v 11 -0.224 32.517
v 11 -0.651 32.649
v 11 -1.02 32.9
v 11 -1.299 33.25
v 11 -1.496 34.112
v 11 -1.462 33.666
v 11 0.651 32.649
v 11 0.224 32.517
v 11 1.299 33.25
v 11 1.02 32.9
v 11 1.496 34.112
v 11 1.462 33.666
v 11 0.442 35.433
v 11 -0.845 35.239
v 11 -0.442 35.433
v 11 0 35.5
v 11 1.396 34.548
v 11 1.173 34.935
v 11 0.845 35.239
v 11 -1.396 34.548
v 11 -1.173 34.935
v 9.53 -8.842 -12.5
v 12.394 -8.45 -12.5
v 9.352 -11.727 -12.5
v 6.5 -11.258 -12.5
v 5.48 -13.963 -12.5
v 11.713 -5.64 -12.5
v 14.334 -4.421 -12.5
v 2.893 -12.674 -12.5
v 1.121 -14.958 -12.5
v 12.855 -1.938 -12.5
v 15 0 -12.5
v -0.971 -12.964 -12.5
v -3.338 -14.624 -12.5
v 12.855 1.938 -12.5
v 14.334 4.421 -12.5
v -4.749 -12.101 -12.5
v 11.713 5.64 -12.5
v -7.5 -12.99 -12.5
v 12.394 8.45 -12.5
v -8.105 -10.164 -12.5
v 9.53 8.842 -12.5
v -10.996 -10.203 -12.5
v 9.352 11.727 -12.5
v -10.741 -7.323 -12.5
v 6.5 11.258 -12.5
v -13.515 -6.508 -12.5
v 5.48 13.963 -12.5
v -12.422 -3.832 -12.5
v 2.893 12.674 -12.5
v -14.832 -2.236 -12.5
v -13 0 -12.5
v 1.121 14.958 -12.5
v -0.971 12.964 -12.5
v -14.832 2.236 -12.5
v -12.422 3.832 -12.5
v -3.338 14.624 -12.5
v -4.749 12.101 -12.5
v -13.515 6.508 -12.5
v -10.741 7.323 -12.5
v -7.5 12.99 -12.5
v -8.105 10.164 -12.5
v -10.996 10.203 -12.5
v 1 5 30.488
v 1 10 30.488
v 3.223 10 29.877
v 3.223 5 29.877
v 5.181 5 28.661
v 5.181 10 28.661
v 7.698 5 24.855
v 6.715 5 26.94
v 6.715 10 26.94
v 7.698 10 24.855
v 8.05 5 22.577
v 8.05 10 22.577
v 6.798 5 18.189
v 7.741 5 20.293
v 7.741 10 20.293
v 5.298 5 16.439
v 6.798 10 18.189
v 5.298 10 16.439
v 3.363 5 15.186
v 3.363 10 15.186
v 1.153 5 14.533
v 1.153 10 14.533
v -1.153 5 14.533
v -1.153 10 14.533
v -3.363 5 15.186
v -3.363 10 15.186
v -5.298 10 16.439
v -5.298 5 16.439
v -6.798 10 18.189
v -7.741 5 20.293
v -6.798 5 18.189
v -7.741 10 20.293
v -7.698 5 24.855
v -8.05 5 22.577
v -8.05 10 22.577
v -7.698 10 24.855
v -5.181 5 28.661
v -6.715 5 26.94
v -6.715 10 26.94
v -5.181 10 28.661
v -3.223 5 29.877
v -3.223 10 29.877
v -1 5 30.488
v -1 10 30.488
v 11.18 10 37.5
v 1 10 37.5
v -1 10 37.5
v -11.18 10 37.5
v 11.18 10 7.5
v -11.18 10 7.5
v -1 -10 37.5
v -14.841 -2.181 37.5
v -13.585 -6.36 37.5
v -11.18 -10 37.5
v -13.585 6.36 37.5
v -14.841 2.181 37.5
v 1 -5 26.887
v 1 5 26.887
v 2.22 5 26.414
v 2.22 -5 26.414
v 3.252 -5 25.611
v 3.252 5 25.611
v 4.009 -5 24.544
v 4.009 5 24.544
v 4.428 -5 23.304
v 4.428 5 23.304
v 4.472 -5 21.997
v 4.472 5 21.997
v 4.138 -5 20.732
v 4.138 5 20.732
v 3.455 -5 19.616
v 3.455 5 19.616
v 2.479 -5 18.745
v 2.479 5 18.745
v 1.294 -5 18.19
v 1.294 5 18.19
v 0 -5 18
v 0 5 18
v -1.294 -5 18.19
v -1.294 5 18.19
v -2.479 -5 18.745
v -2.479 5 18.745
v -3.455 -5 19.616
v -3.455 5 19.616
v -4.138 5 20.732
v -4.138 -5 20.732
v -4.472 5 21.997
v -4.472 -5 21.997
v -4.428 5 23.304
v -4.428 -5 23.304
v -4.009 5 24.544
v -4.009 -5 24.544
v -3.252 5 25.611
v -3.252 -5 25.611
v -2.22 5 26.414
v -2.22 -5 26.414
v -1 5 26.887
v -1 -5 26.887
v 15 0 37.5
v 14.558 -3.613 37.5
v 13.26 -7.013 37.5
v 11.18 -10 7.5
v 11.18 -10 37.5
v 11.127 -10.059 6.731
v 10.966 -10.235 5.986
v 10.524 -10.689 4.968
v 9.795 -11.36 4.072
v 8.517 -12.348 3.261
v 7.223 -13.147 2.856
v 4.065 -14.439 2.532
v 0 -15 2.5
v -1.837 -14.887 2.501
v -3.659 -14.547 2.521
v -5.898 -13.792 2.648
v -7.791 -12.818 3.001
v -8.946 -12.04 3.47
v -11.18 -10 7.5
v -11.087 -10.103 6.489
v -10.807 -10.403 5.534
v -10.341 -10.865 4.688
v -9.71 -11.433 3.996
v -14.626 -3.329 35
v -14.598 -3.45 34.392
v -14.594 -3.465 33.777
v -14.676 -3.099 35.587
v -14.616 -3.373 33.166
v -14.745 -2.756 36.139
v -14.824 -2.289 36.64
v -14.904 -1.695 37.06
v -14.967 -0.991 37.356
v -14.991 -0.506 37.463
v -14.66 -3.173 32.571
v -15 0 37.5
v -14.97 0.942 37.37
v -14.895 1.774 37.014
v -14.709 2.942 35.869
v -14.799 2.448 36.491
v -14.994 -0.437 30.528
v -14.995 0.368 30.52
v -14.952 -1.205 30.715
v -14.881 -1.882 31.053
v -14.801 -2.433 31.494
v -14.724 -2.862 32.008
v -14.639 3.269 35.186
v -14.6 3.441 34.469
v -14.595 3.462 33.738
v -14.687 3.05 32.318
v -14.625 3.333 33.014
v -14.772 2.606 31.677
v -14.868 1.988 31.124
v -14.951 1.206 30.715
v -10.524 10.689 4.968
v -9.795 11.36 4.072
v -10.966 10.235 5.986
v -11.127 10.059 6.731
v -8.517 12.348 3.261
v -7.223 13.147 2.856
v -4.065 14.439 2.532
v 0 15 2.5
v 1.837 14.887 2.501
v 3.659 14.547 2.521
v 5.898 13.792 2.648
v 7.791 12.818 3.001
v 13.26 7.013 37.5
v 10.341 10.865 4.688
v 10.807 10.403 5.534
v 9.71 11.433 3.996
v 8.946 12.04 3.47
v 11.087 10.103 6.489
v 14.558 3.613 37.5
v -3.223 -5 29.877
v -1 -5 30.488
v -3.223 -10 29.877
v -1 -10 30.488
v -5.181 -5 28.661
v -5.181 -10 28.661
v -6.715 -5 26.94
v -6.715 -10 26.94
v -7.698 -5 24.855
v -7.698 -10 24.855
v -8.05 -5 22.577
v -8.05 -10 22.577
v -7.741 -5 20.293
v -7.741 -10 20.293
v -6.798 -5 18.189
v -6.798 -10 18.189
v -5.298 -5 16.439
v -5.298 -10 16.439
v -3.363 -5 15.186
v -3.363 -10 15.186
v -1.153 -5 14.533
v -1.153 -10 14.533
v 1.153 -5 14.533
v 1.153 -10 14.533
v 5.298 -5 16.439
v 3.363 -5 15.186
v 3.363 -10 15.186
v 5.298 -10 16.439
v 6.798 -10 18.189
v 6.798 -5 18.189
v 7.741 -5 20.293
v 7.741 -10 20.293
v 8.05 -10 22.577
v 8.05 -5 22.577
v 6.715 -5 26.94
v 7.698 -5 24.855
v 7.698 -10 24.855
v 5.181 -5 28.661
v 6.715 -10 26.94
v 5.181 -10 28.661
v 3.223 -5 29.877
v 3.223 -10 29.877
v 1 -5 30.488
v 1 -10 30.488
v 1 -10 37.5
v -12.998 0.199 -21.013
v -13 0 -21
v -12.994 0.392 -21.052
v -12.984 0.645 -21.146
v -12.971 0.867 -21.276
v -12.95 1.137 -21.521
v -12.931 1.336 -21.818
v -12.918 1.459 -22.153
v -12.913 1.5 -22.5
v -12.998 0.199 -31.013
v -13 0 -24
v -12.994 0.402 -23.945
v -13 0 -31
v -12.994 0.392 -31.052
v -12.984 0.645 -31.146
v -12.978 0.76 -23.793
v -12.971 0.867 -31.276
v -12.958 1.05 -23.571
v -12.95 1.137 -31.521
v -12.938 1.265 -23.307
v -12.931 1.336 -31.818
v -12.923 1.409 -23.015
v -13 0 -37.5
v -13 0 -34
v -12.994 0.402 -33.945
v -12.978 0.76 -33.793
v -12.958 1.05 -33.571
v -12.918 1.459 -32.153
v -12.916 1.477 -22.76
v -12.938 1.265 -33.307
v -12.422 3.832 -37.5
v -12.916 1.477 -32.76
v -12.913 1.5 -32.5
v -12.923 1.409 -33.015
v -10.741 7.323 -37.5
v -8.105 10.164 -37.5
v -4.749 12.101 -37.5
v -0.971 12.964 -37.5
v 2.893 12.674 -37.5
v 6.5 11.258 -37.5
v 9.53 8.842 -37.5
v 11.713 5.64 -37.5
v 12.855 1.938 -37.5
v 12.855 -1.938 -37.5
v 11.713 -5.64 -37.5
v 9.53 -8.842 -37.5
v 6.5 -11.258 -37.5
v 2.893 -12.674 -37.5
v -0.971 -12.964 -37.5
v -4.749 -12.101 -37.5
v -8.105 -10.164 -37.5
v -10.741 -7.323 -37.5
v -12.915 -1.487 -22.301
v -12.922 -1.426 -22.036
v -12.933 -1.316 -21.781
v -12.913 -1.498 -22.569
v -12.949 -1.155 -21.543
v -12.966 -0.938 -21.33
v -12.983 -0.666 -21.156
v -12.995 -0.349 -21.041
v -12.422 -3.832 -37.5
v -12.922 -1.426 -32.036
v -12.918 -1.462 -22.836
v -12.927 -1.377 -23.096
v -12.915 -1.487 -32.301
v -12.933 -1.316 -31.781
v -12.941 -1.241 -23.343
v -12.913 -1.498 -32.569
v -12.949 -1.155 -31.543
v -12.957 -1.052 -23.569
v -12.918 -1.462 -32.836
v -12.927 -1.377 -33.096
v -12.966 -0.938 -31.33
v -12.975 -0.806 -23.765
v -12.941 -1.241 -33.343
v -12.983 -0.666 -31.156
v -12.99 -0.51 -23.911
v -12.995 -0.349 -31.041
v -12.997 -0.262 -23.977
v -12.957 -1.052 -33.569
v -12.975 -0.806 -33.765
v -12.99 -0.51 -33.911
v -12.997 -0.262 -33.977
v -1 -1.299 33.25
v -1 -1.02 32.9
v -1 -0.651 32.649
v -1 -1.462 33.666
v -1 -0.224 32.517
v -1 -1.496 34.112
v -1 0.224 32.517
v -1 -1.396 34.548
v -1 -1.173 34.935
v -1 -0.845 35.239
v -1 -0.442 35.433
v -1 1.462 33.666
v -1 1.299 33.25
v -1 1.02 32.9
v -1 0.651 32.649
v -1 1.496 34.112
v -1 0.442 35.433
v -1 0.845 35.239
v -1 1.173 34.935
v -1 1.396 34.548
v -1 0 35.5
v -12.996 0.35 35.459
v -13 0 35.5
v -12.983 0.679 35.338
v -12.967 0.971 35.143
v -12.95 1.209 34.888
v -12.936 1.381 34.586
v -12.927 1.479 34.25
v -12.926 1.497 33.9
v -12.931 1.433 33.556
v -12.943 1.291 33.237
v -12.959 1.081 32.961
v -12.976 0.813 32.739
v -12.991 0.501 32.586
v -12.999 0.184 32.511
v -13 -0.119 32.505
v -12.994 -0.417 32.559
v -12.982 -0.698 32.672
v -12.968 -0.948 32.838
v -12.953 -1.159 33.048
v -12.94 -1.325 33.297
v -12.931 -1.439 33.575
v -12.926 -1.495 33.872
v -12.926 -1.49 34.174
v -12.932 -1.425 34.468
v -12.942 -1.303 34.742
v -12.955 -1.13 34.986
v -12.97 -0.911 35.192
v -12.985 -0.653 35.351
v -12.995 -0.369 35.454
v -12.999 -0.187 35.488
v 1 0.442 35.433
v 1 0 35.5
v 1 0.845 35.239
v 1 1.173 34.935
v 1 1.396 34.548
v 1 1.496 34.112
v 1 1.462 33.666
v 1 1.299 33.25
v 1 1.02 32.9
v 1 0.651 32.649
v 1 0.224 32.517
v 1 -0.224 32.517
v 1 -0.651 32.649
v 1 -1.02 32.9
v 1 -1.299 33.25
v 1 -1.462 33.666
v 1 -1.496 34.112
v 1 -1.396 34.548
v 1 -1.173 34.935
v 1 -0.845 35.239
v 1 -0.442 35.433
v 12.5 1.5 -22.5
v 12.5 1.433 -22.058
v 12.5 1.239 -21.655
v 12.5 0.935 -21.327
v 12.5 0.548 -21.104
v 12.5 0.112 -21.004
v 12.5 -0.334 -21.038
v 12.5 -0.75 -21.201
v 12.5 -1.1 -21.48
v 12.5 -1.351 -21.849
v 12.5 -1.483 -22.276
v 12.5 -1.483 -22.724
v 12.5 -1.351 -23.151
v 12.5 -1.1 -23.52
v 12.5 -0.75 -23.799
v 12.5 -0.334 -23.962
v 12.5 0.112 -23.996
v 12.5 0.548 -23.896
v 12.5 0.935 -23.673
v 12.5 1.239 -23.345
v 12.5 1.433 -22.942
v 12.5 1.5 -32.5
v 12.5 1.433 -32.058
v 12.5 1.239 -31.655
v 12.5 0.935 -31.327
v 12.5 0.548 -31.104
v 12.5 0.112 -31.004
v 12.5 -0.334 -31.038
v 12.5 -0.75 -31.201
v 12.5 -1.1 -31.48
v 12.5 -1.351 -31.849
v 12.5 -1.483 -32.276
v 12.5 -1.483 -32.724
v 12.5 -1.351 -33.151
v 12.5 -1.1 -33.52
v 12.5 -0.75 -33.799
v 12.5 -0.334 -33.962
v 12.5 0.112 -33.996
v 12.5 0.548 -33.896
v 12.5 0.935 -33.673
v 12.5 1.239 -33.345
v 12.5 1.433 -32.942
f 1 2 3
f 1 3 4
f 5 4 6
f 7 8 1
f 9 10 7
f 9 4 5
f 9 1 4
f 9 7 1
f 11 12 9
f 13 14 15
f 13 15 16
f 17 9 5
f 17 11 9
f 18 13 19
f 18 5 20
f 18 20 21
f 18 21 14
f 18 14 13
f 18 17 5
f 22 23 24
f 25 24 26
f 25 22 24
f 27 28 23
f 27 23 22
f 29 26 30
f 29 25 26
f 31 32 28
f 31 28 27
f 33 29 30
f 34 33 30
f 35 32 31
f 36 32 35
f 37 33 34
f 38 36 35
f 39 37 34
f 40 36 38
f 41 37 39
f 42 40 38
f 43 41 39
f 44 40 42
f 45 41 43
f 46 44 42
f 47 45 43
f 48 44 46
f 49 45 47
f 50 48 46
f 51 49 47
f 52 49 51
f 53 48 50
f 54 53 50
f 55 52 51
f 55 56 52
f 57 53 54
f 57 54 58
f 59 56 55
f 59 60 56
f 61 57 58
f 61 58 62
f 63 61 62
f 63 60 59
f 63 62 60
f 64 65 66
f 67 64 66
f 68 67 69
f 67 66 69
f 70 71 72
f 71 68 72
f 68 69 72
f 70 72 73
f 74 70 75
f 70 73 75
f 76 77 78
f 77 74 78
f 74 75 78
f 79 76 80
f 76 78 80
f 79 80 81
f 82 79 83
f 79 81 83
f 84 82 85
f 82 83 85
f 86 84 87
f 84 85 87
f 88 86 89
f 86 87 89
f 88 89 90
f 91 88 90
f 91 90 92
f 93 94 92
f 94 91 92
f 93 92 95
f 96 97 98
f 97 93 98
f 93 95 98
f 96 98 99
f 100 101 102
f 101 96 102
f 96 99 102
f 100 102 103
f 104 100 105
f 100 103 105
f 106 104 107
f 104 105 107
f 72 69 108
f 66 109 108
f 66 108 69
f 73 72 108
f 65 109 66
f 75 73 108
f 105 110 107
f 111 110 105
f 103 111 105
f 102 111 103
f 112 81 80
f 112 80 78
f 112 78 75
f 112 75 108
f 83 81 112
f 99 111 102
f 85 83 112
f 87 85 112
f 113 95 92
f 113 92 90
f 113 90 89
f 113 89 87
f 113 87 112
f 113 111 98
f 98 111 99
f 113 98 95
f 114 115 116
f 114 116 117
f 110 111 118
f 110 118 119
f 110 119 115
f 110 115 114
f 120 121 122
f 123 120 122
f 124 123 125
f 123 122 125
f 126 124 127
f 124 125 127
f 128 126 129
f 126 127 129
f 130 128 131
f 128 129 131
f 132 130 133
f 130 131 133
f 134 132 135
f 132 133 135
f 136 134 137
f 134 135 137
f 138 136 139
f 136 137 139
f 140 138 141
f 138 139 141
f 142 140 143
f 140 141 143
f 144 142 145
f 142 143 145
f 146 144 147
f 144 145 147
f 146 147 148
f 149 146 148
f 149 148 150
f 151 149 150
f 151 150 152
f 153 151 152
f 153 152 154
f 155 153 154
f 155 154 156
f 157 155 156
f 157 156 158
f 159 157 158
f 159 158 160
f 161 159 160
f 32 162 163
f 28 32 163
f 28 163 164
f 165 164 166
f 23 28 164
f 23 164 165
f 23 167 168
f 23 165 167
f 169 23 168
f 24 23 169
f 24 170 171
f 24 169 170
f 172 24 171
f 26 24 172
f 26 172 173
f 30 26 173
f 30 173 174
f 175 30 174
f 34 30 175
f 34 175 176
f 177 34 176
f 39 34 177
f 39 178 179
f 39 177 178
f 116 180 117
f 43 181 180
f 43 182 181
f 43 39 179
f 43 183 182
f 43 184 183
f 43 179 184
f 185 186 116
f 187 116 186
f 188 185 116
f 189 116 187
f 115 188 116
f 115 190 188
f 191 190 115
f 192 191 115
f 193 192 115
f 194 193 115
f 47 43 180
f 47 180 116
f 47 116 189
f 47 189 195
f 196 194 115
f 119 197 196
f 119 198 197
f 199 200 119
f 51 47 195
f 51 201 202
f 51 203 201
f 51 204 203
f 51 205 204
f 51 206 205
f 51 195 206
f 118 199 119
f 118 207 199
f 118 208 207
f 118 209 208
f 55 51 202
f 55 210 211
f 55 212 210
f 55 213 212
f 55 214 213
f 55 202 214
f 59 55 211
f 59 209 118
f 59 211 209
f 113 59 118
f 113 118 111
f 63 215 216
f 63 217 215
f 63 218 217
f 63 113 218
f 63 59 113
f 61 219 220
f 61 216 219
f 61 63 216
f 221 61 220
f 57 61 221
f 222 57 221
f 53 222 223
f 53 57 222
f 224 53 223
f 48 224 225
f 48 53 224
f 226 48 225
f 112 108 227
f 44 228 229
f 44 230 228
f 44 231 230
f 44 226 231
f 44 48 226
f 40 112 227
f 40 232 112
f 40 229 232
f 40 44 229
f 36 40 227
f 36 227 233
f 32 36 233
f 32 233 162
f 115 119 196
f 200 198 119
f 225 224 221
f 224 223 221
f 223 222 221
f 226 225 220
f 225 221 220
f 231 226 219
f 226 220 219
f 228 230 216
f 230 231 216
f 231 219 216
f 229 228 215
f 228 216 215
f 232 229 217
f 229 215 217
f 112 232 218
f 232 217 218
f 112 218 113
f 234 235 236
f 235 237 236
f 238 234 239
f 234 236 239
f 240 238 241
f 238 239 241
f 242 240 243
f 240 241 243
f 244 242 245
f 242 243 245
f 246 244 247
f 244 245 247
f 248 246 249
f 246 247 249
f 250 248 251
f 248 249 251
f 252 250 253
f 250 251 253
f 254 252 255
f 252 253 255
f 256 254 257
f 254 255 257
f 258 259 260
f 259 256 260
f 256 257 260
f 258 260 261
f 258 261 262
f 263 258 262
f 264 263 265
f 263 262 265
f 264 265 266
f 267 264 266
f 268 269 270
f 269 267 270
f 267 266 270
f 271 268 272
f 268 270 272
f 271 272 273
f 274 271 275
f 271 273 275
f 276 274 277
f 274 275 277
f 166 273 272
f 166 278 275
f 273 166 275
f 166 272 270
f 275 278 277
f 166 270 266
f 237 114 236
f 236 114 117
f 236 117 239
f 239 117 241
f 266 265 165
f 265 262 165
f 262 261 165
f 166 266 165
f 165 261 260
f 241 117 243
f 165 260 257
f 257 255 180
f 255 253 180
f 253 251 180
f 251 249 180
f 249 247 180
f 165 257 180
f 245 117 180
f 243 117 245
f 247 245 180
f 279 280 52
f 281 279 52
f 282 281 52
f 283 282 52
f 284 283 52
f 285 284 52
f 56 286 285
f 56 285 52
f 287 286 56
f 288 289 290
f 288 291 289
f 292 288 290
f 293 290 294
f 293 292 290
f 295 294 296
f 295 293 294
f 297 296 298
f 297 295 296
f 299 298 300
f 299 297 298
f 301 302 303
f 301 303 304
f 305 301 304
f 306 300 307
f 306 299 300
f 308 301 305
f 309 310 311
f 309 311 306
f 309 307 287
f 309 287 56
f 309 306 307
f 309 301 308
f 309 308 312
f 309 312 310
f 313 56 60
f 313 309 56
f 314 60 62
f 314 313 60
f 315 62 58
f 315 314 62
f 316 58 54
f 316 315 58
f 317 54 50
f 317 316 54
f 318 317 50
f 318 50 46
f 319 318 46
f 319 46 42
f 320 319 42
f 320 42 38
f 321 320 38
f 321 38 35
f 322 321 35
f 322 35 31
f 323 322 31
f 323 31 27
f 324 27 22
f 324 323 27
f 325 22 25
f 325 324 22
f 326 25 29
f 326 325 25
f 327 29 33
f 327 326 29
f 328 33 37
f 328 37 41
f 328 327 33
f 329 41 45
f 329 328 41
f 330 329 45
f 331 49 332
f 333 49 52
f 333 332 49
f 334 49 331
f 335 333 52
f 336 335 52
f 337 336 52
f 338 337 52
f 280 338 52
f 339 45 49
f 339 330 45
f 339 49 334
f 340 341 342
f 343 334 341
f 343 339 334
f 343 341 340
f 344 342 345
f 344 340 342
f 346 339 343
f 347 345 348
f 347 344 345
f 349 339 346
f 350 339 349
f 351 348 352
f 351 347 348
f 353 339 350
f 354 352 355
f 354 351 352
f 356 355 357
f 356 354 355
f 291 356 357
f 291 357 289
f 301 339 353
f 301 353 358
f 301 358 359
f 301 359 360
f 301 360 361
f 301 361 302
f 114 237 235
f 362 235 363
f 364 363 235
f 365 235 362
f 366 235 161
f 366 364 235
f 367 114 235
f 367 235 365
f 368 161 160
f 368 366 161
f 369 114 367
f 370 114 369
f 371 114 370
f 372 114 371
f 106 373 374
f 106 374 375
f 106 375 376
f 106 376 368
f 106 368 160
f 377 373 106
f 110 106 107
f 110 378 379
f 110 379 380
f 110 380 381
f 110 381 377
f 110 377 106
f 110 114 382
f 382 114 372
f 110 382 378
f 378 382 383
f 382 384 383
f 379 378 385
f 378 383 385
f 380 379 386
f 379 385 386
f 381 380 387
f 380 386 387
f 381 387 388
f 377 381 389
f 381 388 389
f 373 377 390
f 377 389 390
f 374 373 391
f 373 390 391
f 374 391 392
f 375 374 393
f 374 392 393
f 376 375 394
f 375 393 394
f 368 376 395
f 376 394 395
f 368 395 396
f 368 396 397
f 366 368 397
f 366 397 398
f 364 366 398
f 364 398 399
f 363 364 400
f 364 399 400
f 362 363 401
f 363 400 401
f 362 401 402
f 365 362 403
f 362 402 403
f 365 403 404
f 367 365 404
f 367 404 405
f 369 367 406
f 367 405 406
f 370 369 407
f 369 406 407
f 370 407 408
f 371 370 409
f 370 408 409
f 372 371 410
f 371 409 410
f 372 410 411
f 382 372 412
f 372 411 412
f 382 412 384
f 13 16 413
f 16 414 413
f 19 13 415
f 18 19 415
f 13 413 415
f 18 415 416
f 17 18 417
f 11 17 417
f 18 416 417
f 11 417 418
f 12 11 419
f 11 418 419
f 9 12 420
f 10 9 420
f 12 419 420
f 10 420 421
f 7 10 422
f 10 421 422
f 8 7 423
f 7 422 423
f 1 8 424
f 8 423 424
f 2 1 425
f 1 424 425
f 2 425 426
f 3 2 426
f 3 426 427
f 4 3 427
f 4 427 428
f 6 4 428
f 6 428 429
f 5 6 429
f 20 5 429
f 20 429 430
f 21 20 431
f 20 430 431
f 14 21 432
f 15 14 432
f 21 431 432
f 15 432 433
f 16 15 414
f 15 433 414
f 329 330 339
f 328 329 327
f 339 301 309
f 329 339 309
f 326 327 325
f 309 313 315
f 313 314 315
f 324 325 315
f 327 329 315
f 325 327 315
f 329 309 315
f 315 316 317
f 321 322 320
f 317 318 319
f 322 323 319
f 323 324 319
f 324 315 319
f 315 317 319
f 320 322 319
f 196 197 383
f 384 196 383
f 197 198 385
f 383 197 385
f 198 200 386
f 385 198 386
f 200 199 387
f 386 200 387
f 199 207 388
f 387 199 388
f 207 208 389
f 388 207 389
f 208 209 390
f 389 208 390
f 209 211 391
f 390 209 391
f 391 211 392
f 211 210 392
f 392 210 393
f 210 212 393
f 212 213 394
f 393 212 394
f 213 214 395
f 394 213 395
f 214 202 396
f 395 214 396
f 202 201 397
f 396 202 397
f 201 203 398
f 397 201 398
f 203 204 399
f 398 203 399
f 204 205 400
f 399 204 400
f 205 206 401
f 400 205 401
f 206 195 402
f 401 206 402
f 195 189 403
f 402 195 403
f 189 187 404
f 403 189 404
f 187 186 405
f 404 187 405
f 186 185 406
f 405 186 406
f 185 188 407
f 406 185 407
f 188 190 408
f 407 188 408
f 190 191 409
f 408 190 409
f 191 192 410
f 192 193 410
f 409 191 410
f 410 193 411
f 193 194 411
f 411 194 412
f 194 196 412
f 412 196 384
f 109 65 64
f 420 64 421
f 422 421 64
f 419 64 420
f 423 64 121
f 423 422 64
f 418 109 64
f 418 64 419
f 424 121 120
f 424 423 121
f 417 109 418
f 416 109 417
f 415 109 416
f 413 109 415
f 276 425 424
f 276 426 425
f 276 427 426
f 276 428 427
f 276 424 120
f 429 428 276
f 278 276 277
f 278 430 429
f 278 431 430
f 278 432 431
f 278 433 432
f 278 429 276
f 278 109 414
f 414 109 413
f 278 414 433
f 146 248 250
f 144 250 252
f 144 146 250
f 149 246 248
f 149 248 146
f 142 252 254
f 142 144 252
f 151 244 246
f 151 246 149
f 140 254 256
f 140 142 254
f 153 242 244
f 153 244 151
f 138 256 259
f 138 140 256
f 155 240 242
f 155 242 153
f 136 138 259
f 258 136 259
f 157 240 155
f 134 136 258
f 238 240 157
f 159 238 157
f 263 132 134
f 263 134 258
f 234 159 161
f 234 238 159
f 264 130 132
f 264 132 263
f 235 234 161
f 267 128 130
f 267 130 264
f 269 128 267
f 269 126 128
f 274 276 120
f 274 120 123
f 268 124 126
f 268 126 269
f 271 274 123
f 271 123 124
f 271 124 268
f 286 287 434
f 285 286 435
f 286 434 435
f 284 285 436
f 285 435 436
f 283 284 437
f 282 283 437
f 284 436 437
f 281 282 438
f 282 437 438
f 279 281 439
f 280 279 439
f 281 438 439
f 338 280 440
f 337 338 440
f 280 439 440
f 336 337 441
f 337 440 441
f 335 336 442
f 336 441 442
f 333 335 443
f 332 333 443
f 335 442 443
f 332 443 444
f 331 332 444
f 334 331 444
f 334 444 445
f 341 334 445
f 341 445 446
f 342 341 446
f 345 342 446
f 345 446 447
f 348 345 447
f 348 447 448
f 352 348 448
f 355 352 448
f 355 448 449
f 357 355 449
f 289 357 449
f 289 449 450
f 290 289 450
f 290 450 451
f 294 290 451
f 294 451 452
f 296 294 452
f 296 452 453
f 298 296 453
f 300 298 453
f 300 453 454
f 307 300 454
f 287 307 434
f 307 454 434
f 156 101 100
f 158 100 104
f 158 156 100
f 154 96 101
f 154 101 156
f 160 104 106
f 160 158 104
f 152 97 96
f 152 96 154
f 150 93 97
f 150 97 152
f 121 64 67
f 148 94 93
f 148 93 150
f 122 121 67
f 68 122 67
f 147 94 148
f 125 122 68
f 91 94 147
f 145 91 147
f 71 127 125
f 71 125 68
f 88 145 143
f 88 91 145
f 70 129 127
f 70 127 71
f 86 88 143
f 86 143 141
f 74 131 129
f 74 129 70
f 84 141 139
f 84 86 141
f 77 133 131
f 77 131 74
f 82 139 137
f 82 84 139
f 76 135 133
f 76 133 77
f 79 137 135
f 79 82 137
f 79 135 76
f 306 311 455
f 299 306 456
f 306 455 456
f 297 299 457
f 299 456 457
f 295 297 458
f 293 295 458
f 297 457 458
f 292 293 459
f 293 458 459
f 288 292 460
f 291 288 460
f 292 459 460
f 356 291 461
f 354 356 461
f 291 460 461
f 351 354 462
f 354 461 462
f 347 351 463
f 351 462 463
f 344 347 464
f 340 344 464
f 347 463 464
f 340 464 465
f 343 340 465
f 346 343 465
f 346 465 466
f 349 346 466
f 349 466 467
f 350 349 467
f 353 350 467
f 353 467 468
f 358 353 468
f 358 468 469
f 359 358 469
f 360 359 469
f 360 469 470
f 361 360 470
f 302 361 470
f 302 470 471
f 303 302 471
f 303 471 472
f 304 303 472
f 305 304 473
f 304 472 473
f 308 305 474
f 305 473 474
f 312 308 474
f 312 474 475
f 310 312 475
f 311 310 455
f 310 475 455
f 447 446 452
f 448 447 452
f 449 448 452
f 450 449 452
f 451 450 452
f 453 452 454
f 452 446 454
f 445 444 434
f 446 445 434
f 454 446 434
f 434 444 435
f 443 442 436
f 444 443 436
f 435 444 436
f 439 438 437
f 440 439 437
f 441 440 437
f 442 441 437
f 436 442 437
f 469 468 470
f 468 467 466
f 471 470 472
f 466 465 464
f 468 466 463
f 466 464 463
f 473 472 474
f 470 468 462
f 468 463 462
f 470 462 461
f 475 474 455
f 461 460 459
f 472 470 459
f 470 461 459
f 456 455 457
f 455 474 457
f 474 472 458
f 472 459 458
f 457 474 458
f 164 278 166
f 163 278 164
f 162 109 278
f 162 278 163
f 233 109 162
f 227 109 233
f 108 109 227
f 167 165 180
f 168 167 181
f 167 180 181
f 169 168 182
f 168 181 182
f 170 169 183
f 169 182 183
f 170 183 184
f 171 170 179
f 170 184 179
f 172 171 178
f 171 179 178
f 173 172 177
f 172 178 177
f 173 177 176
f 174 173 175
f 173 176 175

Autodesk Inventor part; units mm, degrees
ref_plane "YZ Plane" through (0, 0, 0) normal (1, 0, 0) x (0, 1, 0)
ref_plane "XZ Plane" through (0, 0, 0) normal (0, 1, 0) x (-1, 0, 0)
ref_plane "XY Plane" through (0, 0, 0) normal (0, 0, 1) x (1, 0, 0)
sketch "Szkic1" plane through (0, 0, 0) normal (0, 0, 1) x (1, 0, 0)
  circle A0 centre (0, 0) radius 15
  dimension "d0" = 30
extrude "Wyciągnięcie proste1" add sketch "Szkic1" along normal mid plane 75
sketch "Szkic2" plane through (0, 0, -37.5) normal (0, 0, -1) x (-1, 0, 0)
  circle A0 centre (0, 0) radius 13
  circle A1 centre (0, 0) radius 15
  dimension "d3" = 26
  dimension "d4" = 30
extrude "Wyciągnięcie proste2" cut sketch "Szkic2" against normal blind 25
sketch "Szkic3" plane through (0, 0, 0) normal (1, 0, 0) x (0, 1, 0)
  circle A0 centre (0, -32.5) radius 1.5
  circle A1 centre (0, -22.5) radius 1.5
  line L0 (-13, -37.5) -> (13, -37.5) projected
  point P0 (0, 0)
  dimension "d7" = 3
  dimension "d8" = 3
  dimension "d13" = 10
  dimension "d14" = 5
extrude "Wyciągnięcie proste3" cut sketch "Szkic3" against normal blind 25 and the other way blind 12.5
thread "Gwint1" size "M3x0.5" class "6H" standard "ANSI Metric M Profile" full length
thread "Gwint2" size "M3x0.5" class "6H" standard "ANSI Metric M Profile" full length
sketch "Szkic4" plane through (0, 0, 0) normal (1, 0, 0) x (0, 1, 0)
  line L0 (15, 37.5) -> (-15, 37.5) projected
  line L1 (-15, 37.5) -> (-10, 37.5)
  line L2 (-10, 37.5) -> (-10, 7.5)
  line L3 (-15, 2.5) -> (-15, 2.5)
  line L4 (-15, 2.5) -> (-15, 37.5)
  line L5 (15, 37.5) -> (10, 37.5)
  line L6 (10, 37.5) -> (10, 7.5)
  line L7 (15, 2.5) -> (15, 2.5)
  line L8 (15, 2.5) -> (15, 37.5)
  arc A0 (-15, 2.5) -> (-10, 7.5) centre (-15, 7.5) ccw
  arc A1 (10, 7.5) -> (15, 2.5) centre (15, 7.5) ccw
  point P0 (0, 0)
  point P1 (-10, 2.5)
  point P2 (10, 2.5)
  dimension "d19" = 5
  dimension "d20" = 35
  dimension "d21" = 5
  dimension "d22" = 35
  dimension "d25" = 5
  dimension "d26" = 5
extrude "Wyciągnięcie proste4" cut sketch "Szkic4" along normal mid plane 30
sketch "Szkic6" plane through (-11.1803, 10, 7.5) normal (0, 1, 0) x (1, 0, 0)
  line L0 (-3.8197, -30) -> (0, -30) construction
  line L1 (0, 0) -> (22.3607, 0) construction
  line L2 (0, -30) -> (22.3607, -30) construction
  line L3 (22.3607, -30) -> (22.3607, 0) construction
  line L4 (22.3607, 0) -> (0, 0) construction
  line L5 (0, 0) -> (0, -30) construction
  circle A0 centre (11.1803, -15) radius 8.05
  point P0 (11.1803, 7.5)
  dimension "d30" = 16.1
extrude "Wyciągnięcie proste6" cut sketch "Szkic6" against normal blind 5
sketch "Szkic7" plane through (0, 5, 22.5) normal (0, 1, 0) x (1, 0, 0)
  circle A0 centre (0, 0) radius 4.5
  point P0 (0, 22.5)
  dimension "d33" = 9
extrude "Wyciągnięcie proste7" cut sketch "Szkic7" against normal blind 30
sketch "Szkic8" plane through (0, 0, 37.5) normal (0, 0, 1) x (1, 0, 0)
  line L0 (-1, 10) -> (1, 10)
  line L1 (1, 10) -> (1, -10)
  line L2 (1, -10) -> (-1, -10)
  line L3 (-1, -10) -> (-1, 10)
  line L4 (-1, 10) -> (1, -10) construction
  line L5 (1, 10) -> (-1, -10) construction
  point P0 (0, 0)
  dimension "d36" = 2
  dimension "d37" = 20
extrude "Wyciągnięcie proste8" cut sketch "Szkic8" against normal blind 12
sketch "Szkic9" plane through (1, -10, 37.5) normal (-1, 0, 0) x (0, 0, 1)
  circle A0 centre (-3.5, 10) radius 1.5
  point P0 (-37.5, 10)
  dimension "d40" = 3
extrude "Wyciągnięcie proste9" cut sketch "Szkic9" against normal blind 10 and the other way blind 20
thread "Gwint3" size "M3x0.5" class "6H" standard "ANSI Metric M Profile" full length
sketch "Szkic10" plane through (-11.1803, -10, 7.5) normal (0, -1, 0) x (1, 0, 0)
  arc A0 (10.1803, 19.3875) -> (12.1803, 19.3875) centre (11.1803, 15) ccw projected
  circle A1 centre (11.1803, 15) radius 8.05
  point P0 (11.1803, -7.5)
  dimension "d49" = 16.1
extrude "Wyciągnięcie proste10" cut sketch "Szkic10" against normal blind 5
chamfer "Faza1" distance 2 angle 45 1 edges at (-15, -0.0202, 32.5001)
equation "\"d21\" = d19"
equation "\"d22\" = d20"
equation "\"d26\" = d25"
properties part number "koncowka" material "Aluminium 6061"
